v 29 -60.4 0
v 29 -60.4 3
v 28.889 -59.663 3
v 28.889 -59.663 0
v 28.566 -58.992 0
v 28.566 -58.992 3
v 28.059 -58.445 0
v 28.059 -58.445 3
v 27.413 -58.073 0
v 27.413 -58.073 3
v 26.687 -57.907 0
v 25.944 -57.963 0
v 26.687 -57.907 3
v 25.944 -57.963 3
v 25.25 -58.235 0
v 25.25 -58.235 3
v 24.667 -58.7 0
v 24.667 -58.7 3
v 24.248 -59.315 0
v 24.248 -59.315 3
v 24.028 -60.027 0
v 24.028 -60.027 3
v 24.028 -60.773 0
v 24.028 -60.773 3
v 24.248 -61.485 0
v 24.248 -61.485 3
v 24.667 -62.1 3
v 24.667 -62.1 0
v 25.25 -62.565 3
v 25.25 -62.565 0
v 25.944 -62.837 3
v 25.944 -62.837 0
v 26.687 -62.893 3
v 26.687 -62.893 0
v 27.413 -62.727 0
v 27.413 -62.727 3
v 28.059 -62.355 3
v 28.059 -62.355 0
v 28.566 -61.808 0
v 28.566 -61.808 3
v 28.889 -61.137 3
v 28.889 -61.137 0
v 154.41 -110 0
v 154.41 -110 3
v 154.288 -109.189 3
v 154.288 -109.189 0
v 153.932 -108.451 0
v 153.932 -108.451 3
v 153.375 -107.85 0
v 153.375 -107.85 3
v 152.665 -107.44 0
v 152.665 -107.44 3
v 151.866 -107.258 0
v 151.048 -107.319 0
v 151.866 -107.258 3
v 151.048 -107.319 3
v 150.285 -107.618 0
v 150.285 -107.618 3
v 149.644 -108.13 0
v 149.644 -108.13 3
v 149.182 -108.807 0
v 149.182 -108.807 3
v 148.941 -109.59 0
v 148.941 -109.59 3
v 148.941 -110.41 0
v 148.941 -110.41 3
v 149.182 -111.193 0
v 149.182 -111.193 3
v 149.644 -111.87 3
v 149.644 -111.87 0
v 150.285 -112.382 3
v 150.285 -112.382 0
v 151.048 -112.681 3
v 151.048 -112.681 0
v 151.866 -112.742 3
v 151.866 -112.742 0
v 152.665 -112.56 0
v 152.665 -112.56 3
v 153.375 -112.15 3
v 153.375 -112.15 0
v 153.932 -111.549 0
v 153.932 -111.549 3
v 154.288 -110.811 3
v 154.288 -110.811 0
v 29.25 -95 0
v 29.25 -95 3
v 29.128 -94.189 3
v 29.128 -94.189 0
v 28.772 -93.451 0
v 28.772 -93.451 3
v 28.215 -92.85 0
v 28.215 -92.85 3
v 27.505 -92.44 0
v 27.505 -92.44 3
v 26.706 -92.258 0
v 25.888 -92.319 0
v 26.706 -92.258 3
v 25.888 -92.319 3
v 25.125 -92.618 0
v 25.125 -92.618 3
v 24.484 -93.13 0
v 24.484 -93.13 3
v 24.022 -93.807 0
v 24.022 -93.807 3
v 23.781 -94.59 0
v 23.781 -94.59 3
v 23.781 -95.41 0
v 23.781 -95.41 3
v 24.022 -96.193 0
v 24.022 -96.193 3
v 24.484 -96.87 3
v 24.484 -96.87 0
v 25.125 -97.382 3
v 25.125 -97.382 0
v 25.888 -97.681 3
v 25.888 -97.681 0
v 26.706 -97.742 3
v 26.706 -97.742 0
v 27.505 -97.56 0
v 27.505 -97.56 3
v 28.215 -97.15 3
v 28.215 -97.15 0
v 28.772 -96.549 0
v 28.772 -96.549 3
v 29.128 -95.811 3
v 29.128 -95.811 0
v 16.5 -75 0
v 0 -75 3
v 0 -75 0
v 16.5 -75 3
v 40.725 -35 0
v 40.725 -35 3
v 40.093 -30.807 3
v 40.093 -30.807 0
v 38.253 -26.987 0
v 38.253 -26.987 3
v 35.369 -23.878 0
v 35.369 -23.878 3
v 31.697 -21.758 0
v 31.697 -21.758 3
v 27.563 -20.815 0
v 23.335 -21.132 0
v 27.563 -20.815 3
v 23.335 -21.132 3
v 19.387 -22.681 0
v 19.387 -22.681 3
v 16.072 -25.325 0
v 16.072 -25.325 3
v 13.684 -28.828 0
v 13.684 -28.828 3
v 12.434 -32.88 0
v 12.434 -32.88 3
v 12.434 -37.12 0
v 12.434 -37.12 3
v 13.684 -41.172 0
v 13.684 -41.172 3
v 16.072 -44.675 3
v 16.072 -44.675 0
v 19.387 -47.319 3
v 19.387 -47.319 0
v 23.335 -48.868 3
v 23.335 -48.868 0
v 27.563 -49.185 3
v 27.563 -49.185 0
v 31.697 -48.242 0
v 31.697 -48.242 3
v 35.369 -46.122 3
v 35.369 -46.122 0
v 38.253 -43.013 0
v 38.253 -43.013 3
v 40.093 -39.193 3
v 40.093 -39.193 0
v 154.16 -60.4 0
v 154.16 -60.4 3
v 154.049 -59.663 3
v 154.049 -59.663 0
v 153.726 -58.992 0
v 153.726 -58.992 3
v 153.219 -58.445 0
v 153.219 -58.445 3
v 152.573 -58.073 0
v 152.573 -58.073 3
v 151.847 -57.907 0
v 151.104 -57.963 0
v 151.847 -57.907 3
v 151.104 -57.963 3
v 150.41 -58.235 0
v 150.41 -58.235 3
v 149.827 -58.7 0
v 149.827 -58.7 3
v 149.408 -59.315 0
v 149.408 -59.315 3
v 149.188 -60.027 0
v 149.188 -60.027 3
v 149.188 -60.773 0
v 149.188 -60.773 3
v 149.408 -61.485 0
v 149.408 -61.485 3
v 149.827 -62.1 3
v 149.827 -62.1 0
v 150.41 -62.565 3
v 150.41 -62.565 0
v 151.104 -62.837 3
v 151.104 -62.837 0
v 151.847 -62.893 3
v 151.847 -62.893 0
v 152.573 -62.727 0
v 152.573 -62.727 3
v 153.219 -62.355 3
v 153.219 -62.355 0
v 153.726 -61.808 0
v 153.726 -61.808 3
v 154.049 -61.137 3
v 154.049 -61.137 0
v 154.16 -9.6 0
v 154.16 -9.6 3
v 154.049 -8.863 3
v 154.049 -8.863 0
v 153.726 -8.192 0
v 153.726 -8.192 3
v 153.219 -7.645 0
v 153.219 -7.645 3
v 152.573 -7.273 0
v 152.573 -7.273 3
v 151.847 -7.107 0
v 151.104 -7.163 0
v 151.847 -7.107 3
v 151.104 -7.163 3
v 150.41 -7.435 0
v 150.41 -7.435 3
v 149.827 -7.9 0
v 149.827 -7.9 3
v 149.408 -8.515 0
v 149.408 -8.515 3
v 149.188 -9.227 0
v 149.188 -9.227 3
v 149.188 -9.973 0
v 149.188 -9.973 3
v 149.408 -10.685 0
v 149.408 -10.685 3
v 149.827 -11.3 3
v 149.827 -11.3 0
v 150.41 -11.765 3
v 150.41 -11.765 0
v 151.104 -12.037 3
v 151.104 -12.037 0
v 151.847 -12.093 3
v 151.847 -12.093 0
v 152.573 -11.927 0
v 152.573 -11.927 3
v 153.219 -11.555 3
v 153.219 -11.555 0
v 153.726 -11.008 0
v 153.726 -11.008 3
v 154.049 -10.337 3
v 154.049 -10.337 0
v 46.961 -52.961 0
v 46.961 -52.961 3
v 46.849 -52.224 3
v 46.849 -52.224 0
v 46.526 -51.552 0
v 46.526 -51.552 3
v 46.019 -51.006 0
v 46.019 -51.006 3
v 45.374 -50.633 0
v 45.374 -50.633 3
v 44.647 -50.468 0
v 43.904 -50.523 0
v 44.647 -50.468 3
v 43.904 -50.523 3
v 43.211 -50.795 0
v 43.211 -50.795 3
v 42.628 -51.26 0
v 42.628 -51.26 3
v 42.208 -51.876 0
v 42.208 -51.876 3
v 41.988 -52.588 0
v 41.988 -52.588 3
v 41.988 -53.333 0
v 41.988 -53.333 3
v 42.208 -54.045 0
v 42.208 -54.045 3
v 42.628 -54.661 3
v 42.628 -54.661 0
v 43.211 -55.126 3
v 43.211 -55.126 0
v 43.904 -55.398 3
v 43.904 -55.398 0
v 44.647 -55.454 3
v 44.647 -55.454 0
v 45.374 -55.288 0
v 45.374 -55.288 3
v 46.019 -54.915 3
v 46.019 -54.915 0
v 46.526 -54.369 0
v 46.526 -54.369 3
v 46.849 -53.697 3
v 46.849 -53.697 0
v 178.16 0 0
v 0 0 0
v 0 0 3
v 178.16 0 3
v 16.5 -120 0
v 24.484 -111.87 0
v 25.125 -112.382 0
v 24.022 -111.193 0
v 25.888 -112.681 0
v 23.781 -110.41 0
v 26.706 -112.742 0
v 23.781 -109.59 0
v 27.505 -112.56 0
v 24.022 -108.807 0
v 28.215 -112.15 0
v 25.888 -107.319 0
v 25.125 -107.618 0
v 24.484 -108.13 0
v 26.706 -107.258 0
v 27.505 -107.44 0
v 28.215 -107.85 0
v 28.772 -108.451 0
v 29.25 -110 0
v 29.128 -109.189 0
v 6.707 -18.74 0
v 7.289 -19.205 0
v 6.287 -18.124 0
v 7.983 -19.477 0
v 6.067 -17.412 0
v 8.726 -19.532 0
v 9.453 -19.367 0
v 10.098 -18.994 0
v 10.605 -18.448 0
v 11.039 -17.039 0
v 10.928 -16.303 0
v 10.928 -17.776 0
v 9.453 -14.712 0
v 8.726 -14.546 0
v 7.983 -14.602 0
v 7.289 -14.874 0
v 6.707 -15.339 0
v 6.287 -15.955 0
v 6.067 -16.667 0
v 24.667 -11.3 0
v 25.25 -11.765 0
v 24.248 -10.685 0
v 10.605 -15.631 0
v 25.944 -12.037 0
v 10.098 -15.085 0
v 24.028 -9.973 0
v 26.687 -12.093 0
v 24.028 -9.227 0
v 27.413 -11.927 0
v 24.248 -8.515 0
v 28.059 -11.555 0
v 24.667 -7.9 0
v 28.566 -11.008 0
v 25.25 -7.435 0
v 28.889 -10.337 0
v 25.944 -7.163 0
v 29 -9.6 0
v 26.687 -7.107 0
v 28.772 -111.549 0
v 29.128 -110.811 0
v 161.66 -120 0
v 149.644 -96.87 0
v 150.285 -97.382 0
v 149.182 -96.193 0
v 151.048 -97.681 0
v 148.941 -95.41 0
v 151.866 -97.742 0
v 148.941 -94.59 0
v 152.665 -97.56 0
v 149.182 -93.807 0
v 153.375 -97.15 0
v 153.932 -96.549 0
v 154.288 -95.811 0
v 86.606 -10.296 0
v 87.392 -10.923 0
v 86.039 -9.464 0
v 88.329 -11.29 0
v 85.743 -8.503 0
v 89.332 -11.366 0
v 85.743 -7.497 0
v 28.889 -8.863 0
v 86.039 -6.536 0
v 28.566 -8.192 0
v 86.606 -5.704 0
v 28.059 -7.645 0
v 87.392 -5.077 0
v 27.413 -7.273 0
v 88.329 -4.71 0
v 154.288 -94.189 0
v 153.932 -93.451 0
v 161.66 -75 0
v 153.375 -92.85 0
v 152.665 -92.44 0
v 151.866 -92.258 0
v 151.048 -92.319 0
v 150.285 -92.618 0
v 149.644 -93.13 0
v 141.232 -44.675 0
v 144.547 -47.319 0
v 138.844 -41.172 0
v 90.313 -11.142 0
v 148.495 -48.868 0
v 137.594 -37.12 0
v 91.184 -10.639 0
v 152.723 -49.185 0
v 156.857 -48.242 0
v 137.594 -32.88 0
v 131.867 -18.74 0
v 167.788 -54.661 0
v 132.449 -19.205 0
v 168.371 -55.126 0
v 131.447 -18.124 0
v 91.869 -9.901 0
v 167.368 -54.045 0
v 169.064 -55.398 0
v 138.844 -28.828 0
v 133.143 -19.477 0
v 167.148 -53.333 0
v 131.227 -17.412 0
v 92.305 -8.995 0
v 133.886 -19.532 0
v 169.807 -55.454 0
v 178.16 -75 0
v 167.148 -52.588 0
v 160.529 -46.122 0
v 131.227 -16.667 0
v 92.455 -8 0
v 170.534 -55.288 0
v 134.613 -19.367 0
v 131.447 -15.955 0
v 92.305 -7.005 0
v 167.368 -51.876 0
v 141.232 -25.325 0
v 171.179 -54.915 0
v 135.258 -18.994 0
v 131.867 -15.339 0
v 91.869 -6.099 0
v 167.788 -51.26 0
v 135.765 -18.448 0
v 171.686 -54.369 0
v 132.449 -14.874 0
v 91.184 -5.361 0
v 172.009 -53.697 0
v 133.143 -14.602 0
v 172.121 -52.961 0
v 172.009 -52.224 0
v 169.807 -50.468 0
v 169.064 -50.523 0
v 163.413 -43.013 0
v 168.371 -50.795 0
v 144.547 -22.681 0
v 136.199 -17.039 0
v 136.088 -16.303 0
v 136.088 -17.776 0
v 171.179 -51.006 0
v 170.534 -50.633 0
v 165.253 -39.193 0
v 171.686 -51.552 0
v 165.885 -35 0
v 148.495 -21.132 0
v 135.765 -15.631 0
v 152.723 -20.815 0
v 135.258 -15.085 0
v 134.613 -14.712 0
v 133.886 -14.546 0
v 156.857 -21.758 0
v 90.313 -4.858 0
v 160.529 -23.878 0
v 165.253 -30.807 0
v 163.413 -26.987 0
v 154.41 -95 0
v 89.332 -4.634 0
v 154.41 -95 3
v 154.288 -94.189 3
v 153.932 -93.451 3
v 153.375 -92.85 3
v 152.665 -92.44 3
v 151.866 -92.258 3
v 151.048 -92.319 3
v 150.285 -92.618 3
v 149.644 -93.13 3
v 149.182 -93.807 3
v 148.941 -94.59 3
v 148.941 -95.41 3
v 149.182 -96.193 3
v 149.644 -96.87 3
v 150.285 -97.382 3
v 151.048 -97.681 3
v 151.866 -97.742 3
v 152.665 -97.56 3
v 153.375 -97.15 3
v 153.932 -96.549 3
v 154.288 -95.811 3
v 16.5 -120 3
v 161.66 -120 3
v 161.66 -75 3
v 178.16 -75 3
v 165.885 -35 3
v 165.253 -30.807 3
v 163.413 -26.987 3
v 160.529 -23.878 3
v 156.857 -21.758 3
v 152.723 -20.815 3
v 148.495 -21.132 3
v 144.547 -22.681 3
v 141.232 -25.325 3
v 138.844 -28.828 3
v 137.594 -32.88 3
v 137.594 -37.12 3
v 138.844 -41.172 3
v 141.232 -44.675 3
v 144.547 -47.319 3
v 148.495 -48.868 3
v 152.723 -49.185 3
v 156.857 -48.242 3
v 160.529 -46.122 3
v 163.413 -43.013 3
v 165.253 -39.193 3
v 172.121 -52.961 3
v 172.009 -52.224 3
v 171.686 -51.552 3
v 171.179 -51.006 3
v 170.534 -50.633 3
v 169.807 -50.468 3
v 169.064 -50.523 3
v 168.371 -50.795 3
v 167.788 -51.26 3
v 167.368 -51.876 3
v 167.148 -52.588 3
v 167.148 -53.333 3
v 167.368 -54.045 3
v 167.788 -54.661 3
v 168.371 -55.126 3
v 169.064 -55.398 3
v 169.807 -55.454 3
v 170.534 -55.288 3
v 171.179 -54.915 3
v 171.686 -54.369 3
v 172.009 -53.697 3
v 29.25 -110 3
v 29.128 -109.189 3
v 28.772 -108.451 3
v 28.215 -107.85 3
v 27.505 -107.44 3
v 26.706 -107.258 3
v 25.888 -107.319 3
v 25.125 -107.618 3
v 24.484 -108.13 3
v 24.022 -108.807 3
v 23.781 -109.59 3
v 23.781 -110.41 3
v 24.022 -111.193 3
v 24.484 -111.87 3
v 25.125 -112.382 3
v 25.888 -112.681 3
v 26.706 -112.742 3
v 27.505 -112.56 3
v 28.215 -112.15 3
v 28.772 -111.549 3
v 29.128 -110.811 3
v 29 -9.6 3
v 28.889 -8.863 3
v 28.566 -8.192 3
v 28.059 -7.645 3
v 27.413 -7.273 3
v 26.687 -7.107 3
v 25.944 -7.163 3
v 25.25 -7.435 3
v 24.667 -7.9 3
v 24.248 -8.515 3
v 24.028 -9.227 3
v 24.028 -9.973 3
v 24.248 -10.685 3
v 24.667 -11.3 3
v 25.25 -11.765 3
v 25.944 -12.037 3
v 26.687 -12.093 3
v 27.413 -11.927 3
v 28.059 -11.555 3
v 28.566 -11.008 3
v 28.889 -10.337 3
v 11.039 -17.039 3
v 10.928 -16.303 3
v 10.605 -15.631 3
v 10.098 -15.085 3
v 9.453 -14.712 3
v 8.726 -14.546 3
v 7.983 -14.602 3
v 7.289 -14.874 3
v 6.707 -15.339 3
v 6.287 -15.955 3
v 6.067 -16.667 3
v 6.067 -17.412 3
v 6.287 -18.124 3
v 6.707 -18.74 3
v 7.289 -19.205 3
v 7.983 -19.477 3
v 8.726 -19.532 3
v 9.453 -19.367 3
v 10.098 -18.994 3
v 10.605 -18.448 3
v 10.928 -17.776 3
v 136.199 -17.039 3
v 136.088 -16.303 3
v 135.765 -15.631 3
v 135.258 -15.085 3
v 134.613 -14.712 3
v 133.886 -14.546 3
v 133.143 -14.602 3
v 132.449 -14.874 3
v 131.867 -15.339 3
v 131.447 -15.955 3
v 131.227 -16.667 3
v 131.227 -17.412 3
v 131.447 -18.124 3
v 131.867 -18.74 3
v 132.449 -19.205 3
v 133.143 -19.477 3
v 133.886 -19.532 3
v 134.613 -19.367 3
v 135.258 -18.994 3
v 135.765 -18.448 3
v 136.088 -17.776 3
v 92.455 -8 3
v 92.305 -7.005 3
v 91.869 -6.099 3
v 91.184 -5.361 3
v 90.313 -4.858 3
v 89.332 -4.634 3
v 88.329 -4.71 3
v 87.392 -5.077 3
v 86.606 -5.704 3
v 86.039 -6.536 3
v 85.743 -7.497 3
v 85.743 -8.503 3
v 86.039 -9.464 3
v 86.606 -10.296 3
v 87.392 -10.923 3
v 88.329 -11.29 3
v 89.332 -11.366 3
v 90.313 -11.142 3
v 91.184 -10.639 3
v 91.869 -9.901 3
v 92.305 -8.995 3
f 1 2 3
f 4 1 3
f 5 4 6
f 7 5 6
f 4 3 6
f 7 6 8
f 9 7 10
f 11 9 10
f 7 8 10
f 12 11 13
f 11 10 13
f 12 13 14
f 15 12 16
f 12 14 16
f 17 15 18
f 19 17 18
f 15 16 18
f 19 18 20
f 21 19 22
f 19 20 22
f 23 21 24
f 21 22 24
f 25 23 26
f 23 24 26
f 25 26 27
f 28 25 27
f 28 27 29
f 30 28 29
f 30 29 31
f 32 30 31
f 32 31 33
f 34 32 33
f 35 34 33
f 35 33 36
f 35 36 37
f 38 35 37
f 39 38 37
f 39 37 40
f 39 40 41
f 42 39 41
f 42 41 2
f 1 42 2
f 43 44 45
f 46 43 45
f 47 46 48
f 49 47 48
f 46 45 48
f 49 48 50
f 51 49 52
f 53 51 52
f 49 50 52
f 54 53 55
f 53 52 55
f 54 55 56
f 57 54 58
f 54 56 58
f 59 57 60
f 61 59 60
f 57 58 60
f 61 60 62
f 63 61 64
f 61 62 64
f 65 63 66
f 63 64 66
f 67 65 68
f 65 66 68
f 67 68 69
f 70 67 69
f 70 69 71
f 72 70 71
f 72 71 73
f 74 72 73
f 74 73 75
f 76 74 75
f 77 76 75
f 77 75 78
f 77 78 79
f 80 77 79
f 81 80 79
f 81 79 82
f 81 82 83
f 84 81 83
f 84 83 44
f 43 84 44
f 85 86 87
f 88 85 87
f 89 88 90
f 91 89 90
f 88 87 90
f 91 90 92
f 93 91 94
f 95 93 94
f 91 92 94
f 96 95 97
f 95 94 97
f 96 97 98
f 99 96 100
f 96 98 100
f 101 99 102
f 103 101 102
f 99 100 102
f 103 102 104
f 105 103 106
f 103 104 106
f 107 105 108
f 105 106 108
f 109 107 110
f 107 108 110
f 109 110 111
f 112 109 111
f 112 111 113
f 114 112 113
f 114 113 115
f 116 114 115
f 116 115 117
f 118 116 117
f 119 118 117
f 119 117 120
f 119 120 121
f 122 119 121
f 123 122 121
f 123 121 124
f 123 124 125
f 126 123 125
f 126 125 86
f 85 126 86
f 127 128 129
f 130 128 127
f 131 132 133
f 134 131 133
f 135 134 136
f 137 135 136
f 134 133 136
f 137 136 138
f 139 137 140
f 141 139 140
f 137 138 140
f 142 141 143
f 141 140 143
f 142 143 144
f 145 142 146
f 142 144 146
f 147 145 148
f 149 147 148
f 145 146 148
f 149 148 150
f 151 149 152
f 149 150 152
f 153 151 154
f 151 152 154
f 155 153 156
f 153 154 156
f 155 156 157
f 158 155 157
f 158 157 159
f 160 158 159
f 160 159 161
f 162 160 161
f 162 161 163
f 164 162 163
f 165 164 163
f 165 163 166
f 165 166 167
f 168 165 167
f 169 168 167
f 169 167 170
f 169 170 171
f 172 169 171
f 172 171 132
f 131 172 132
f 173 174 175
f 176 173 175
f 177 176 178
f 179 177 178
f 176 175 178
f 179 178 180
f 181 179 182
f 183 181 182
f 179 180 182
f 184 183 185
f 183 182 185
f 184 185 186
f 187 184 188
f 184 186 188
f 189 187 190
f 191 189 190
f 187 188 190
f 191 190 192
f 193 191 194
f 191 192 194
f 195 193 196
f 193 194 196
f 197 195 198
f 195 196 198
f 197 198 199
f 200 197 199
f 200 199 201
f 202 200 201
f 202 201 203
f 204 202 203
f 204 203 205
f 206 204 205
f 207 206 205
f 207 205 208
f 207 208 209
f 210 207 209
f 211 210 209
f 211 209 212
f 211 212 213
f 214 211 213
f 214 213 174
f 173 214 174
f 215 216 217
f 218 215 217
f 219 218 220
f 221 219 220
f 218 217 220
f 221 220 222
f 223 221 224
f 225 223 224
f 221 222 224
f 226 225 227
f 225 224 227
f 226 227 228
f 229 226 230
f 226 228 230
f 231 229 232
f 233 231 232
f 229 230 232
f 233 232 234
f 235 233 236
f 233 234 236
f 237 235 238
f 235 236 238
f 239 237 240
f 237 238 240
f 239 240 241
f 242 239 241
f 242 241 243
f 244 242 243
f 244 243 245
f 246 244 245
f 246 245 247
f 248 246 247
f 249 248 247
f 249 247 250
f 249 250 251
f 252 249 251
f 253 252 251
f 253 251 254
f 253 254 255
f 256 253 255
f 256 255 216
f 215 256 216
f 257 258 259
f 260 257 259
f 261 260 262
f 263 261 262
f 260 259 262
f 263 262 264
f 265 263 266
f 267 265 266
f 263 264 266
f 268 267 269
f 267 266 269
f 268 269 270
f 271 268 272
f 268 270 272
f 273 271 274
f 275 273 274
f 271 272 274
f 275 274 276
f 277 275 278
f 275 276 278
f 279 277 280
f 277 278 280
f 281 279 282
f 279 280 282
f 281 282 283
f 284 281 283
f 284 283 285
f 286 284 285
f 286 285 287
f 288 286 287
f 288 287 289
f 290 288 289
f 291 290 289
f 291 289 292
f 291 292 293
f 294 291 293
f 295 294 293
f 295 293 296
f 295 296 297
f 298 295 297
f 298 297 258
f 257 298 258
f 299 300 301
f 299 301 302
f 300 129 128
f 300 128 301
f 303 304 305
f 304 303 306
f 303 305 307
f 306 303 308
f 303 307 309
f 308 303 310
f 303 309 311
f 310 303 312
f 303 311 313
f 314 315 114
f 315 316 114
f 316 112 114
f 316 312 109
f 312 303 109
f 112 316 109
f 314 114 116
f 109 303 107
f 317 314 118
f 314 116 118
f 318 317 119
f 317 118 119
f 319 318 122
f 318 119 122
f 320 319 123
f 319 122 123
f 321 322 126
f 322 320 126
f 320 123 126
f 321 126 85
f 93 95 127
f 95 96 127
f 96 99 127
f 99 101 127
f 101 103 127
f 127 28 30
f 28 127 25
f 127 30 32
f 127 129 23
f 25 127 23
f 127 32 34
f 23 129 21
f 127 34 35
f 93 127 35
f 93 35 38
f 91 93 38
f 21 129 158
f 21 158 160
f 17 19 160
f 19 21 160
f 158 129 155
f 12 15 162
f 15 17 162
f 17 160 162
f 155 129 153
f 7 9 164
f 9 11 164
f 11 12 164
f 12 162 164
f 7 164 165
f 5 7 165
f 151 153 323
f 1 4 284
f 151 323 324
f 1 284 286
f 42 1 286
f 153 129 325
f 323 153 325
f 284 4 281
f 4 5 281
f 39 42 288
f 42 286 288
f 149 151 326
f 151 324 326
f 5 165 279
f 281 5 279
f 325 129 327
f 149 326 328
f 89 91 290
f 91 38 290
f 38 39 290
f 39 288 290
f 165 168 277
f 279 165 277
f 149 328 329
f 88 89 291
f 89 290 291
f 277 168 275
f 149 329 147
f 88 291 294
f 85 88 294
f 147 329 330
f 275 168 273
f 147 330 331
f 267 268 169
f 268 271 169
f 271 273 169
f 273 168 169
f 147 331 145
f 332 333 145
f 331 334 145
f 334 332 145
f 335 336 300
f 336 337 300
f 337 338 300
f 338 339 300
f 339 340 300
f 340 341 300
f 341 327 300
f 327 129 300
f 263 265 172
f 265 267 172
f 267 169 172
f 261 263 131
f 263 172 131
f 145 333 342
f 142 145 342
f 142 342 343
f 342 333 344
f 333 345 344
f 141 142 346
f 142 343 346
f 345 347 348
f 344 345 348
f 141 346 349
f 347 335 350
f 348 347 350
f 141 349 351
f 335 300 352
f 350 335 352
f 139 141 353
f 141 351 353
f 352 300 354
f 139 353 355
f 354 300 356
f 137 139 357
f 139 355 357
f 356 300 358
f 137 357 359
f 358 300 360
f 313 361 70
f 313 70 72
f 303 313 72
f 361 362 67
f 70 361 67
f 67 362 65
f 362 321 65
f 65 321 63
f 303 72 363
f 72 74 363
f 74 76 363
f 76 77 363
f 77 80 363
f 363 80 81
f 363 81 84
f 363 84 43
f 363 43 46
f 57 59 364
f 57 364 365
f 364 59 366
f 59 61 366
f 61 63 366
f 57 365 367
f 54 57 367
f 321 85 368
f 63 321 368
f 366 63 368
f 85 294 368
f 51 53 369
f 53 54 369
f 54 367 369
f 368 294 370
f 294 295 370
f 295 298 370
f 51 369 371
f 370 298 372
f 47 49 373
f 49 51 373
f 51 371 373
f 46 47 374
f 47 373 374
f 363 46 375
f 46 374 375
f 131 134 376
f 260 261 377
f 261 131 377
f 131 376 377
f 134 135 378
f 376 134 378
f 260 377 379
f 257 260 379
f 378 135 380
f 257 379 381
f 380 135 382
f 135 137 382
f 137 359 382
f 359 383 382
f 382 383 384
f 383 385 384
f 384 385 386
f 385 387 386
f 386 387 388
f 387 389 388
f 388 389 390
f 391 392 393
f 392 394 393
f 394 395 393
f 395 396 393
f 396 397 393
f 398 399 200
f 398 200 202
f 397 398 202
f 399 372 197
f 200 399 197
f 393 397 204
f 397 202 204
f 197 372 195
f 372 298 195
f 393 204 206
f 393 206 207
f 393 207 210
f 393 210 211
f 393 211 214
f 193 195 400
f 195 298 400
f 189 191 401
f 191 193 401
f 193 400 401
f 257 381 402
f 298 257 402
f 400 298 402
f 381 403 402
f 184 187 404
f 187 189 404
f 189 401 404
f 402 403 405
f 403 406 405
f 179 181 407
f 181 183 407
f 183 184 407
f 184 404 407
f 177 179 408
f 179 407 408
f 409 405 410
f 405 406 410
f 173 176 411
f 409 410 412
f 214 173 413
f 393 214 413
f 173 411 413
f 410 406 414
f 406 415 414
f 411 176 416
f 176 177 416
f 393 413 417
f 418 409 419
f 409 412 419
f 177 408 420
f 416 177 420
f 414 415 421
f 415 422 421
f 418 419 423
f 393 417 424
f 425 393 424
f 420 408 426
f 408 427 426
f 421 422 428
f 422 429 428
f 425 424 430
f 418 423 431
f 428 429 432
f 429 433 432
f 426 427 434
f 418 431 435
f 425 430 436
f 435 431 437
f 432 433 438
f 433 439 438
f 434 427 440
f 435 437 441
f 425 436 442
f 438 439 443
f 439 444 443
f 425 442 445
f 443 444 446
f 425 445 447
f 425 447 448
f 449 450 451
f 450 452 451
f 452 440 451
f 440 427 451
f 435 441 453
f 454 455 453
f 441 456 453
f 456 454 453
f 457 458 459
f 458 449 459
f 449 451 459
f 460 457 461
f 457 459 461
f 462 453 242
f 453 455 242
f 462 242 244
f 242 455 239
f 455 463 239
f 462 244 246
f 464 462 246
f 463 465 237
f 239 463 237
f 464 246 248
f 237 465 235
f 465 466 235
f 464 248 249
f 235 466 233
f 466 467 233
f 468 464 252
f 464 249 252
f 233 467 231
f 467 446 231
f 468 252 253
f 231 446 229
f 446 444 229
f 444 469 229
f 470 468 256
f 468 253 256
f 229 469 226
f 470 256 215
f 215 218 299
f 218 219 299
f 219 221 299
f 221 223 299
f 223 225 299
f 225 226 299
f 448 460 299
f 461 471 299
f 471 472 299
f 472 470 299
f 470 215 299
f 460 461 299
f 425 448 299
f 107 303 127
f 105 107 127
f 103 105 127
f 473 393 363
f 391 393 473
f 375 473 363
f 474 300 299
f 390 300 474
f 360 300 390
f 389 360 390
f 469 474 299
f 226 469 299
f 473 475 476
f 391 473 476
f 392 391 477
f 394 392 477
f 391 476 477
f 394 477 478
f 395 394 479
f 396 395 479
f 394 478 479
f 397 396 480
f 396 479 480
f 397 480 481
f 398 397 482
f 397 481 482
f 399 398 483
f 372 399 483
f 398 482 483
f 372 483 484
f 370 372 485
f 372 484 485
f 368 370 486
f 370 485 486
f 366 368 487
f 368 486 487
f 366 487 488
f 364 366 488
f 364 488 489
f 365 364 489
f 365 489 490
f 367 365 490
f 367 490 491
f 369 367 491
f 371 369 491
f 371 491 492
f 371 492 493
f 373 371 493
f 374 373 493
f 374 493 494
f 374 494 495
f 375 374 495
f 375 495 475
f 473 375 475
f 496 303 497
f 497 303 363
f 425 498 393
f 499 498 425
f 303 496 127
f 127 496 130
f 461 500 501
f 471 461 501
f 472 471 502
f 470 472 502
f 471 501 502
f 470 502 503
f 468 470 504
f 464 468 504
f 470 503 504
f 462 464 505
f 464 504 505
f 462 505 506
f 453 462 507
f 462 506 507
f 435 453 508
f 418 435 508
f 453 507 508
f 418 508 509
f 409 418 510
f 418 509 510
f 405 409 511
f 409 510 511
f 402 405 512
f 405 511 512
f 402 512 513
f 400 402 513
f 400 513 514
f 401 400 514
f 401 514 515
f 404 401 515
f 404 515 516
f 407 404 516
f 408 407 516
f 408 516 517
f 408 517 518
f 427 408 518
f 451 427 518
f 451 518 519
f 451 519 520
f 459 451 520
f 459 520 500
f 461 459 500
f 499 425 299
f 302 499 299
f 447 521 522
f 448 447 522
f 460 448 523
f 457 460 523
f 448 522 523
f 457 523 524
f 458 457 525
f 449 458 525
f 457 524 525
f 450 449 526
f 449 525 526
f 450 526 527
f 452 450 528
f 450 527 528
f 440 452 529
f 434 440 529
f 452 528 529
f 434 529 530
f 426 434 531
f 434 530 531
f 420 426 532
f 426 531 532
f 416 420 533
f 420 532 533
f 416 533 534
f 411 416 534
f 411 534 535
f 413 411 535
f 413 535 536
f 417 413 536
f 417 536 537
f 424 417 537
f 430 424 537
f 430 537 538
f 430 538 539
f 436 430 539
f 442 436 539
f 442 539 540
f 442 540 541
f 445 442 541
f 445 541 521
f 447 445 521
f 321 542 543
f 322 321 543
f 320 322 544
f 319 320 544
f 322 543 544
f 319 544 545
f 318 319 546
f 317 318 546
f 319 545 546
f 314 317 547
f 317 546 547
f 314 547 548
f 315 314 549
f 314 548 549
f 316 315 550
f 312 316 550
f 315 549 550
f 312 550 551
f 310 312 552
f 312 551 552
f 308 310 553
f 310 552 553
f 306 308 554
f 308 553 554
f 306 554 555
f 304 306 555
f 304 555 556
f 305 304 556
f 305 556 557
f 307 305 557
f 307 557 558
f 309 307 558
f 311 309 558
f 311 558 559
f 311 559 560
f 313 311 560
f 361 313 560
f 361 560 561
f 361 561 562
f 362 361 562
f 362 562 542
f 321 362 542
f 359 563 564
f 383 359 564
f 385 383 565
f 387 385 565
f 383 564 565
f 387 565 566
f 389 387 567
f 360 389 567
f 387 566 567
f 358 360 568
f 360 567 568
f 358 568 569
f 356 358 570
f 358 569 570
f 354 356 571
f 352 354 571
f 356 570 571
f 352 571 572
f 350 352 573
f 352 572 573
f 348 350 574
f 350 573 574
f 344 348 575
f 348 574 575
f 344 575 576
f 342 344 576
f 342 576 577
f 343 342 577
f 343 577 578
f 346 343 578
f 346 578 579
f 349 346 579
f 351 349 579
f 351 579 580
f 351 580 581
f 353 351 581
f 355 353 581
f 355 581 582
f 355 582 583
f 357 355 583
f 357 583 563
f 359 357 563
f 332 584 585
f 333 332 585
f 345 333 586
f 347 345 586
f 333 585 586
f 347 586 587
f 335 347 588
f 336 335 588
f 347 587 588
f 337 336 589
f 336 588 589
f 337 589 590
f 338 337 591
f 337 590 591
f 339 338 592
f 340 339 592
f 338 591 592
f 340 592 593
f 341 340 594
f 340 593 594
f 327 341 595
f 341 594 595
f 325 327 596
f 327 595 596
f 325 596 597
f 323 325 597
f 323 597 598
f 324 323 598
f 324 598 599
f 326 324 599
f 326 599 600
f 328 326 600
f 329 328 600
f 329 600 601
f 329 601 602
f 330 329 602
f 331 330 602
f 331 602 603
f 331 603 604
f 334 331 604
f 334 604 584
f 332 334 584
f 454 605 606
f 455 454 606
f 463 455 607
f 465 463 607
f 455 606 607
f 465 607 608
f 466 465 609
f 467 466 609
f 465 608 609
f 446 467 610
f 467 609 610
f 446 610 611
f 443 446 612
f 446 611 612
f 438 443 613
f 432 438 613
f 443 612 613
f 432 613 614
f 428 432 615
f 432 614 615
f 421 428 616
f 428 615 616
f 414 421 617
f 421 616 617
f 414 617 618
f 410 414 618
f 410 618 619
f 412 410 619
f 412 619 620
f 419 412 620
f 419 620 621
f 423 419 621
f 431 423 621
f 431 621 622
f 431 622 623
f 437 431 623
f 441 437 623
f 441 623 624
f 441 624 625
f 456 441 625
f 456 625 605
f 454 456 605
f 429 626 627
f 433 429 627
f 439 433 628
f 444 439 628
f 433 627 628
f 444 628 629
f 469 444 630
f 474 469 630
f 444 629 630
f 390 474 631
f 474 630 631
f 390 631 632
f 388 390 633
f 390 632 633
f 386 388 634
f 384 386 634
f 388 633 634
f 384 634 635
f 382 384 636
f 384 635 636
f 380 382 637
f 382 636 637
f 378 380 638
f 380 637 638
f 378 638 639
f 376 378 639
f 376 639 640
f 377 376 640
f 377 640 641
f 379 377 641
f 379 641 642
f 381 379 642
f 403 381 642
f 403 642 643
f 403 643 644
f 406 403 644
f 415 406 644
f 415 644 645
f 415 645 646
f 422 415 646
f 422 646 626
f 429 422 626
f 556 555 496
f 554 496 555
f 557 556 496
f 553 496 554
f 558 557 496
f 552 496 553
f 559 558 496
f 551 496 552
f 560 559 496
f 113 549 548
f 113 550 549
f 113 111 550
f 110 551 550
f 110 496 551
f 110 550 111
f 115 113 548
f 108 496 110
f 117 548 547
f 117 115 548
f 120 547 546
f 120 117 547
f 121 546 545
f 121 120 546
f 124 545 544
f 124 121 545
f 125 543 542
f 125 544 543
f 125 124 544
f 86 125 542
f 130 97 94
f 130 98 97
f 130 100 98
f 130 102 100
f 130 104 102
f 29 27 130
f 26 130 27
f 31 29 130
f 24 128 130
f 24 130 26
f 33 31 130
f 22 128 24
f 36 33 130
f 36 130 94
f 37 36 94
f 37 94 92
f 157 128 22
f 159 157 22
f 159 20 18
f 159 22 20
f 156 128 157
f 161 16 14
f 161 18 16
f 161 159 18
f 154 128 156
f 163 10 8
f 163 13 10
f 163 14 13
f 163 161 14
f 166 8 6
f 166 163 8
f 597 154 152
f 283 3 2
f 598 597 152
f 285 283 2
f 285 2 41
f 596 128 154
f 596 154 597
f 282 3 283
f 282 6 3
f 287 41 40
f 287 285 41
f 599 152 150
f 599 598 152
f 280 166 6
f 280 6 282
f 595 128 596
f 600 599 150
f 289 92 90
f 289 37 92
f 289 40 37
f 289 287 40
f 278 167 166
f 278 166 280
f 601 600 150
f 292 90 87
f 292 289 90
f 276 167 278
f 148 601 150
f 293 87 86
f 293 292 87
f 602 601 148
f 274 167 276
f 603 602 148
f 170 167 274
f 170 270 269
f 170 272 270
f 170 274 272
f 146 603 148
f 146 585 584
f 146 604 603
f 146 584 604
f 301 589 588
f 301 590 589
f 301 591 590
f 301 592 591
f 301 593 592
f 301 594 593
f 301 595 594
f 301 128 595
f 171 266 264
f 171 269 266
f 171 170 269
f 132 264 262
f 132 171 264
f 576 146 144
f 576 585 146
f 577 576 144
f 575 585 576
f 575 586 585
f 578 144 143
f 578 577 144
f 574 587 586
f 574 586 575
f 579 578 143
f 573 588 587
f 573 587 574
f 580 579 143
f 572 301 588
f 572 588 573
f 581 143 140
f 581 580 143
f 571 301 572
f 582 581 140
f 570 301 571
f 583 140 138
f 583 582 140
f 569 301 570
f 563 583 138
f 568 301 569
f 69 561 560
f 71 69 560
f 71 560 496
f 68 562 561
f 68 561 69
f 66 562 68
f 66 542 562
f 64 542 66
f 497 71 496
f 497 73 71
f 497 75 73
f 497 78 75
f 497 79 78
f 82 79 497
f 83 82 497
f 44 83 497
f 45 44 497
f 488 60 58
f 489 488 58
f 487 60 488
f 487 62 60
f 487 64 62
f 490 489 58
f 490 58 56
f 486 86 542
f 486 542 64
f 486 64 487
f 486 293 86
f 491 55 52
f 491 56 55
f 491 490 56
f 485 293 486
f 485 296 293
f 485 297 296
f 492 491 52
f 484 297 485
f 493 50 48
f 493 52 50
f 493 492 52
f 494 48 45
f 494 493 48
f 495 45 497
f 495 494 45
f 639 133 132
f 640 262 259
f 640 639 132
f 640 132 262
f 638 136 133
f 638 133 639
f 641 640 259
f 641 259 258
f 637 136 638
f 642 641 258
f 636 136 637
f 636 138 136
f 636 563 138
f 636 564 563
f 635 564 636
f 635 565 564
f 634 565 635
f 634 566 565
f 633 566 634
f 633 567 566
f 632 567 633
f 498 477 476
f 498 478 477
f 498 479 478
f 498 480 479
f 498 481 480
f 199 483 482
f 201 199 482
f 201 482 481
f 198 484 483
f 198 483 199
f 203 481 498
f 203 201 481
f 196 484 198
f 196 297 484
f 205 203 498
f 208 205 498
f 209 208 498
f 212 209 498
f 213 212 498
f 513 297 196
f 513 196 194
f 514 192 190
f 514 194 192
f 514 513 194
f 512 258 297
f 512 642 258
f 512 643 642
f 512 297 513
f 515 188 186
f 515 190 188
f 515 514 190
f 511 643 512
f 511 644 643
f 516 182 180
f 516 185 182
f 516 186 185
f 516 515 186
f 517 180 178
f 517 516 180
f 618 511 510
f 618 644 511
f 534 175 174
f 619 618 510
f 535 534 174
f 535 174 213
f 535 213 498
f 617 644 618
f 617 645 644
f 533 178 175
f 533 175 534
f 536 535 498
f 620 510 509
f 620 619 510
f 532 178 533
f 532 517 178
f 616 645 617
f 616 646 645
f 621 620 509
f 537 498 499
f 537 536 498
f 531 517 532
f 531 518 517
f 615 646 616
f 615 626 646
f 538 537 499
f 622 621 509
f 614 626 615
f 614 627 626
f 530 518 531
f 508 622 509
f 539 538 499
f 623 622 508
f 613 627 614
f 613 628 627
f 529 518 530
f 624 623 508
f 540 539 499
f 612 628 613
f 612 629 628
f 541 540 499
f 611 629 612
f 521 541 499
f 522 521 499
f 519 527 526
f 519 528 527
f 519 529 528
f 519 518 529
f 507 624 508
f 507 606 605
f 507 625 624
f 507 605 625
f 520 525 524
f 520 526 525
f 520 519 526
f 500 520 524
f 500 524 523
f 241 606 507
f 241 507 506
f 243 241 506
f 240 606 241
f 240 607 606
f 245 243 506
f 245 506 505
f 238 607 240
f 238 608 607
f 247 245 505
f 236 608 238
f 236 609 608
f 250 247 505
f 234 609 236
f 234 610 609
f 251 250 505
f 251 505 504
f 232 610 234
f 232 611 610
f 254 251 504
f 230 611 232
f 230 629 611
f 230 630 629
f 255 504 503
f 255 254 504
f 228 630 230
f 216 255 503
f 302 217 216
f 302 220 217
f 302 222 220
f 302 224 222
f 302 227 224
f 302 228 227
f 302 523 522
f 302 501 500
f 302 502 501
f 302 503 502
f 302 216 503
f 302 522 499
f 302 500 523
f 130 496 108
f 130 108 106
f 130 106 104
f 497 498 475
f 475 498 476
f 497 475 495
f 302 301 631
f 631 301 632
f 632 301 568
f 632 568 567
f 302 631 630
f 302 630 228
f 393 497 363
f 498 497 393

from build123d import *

# Parameters (mm, degrees)
SKETCH1_W           = 178.16
SKETCH1_H           = 120
BOSS_EXTRUDE1_DEPTH = 3
SKETCH2_R           = 14.225
SKETCH2_R_2         = 2.75
SKETCH2_R_3         = 3.375
CUT_EXTRUDE1_DEPTH  = 4
SKETCH3_R           = 2.0193
CUT_EXTRUDE2_DEPTH  = 4
SKETCH6_R           = 2.5
CUT_EXTRUDE3_DEPTH  = 4
SKETCH7_W           = 16.5
SKETCH7_H           = 45
CUT_EXTRUDE4_DEPTH  = 4


with BuildPart() as part:
    # Sketch1 → Boss-Extrude1 (new body)
    with BuildSketch(Plane.XY):
        with Locations((89.08, -60)):
            Rectangle(SKETCH1_W, SKETCH1_H)
    extrude(amount=BOSS_EXTRUDE1_DEPTH)

    # Sketch2 → Cut-Extrude1 (cut, through all)
    with BuildSketch(Plane.XY.offset(3)):
        with Locations((26.5, -35)):
            Circle(SKETCH2_R)
        with Locations((151.66, -35)):
            Circle(SKETCH2_R)
        with Locations((26.5, -110)):
            Circle(SKETCH2_R_2)
        with Locations((151.66, -110)):
            Circle(SKETCH2_R_2)
        with Locations((89.08, -8)):
            Circle(SKETCH2_R_3)
        with Locations((26.5, -95)):
            Circle(SKETCH2_R_2)
        with Locations((151.66, -95)):
            Circle(SKETCH2_R_2)
    extrude(amount=-CUT_EXTRUDE1_DEPTH, mode=Mode.SUBTRACT)

    # Sketch3 → Cut-Extrude2 (cut, through all)
    with BuildSketch(Plane(origin=(0, 0, 0), x_dir=(-1, 0, 0), z_dir=(0, 0, -1))):
        with Locations((-44.460512242, -52.960512242)):
            Circle(SKETCH3_R)
        with Locations((-26.5, -9.6)):
            Circle(SKETCH3_R)
        with Locations((-8.539487758, -17.039487758)):
            Circle(SKETCH3_R)
        with Locations((-26.5, -60.4)):
            Circle(SKETCH3_R)
        with Locations((-133.699487758, -17.039487758)):
            Circle(SKETCH3_R)
        with Locations((-151.66, -9.6)):
            Circle(SKETCH3_R)
        with Locations((-151.66, -60.4)):
            Circle(SKETCH3_R)
        with Locations((-169.620512242, -52.960512242)):
            Circle(SKETCH3_R)
    extrude(amount=-CUT_EXTRUDE2_DEPTH, mode=Mode.SUBTRACT)

    # Sketch6 → Cut-Extrude3 (cut, through all)
    with BuildSketch(Plane.XY.offset(3)):
        with Locations((26.5, -60.4)):
            Circle(SKETCH6_R)
        with Locations((44.460512242, -52.960512242)):
            Circle(SKETCH6_R)
        with Locations((26.5, -9.6)):
            Circle(SKETCH6_R)
        with Locations((8.539487758, -17.039487758)):
            Circle(SKETCH6_R)
        with Locations((169.620512242, -52.960512242)):
            Circle(SKETCH6_R)
        with Locations((151.66, -60.4)):
            Circle(SKETCH6_R)
        with Locations((133.699487758, -17.039487758)):
            Circle(SKETCH6_R)
        with Locations((151.66, -9.6)):
            Circle(SKETCH6_R)
    extrude(amount=-CUT_EXTRUDE3_DEPTH, mode=Mode.SUBTRACT)

    # Sketch7 → Cut-Extrude4 (cut, through all)
    with BuildSketch(Plane.XY.offset(3)):
        with Locations((169.91, -97.5)):
            Rectangle(SKETCH7_W, SKETCH7_H)
        with Locations((8.25, -97.5)):
            Rectangle(SKETCH7_W, SKETCH7_H)
    extrude(amount=-CUT_EXTRUDE4_DEPTH, mode=Mode.SUBTRACT)


solid = part.part
